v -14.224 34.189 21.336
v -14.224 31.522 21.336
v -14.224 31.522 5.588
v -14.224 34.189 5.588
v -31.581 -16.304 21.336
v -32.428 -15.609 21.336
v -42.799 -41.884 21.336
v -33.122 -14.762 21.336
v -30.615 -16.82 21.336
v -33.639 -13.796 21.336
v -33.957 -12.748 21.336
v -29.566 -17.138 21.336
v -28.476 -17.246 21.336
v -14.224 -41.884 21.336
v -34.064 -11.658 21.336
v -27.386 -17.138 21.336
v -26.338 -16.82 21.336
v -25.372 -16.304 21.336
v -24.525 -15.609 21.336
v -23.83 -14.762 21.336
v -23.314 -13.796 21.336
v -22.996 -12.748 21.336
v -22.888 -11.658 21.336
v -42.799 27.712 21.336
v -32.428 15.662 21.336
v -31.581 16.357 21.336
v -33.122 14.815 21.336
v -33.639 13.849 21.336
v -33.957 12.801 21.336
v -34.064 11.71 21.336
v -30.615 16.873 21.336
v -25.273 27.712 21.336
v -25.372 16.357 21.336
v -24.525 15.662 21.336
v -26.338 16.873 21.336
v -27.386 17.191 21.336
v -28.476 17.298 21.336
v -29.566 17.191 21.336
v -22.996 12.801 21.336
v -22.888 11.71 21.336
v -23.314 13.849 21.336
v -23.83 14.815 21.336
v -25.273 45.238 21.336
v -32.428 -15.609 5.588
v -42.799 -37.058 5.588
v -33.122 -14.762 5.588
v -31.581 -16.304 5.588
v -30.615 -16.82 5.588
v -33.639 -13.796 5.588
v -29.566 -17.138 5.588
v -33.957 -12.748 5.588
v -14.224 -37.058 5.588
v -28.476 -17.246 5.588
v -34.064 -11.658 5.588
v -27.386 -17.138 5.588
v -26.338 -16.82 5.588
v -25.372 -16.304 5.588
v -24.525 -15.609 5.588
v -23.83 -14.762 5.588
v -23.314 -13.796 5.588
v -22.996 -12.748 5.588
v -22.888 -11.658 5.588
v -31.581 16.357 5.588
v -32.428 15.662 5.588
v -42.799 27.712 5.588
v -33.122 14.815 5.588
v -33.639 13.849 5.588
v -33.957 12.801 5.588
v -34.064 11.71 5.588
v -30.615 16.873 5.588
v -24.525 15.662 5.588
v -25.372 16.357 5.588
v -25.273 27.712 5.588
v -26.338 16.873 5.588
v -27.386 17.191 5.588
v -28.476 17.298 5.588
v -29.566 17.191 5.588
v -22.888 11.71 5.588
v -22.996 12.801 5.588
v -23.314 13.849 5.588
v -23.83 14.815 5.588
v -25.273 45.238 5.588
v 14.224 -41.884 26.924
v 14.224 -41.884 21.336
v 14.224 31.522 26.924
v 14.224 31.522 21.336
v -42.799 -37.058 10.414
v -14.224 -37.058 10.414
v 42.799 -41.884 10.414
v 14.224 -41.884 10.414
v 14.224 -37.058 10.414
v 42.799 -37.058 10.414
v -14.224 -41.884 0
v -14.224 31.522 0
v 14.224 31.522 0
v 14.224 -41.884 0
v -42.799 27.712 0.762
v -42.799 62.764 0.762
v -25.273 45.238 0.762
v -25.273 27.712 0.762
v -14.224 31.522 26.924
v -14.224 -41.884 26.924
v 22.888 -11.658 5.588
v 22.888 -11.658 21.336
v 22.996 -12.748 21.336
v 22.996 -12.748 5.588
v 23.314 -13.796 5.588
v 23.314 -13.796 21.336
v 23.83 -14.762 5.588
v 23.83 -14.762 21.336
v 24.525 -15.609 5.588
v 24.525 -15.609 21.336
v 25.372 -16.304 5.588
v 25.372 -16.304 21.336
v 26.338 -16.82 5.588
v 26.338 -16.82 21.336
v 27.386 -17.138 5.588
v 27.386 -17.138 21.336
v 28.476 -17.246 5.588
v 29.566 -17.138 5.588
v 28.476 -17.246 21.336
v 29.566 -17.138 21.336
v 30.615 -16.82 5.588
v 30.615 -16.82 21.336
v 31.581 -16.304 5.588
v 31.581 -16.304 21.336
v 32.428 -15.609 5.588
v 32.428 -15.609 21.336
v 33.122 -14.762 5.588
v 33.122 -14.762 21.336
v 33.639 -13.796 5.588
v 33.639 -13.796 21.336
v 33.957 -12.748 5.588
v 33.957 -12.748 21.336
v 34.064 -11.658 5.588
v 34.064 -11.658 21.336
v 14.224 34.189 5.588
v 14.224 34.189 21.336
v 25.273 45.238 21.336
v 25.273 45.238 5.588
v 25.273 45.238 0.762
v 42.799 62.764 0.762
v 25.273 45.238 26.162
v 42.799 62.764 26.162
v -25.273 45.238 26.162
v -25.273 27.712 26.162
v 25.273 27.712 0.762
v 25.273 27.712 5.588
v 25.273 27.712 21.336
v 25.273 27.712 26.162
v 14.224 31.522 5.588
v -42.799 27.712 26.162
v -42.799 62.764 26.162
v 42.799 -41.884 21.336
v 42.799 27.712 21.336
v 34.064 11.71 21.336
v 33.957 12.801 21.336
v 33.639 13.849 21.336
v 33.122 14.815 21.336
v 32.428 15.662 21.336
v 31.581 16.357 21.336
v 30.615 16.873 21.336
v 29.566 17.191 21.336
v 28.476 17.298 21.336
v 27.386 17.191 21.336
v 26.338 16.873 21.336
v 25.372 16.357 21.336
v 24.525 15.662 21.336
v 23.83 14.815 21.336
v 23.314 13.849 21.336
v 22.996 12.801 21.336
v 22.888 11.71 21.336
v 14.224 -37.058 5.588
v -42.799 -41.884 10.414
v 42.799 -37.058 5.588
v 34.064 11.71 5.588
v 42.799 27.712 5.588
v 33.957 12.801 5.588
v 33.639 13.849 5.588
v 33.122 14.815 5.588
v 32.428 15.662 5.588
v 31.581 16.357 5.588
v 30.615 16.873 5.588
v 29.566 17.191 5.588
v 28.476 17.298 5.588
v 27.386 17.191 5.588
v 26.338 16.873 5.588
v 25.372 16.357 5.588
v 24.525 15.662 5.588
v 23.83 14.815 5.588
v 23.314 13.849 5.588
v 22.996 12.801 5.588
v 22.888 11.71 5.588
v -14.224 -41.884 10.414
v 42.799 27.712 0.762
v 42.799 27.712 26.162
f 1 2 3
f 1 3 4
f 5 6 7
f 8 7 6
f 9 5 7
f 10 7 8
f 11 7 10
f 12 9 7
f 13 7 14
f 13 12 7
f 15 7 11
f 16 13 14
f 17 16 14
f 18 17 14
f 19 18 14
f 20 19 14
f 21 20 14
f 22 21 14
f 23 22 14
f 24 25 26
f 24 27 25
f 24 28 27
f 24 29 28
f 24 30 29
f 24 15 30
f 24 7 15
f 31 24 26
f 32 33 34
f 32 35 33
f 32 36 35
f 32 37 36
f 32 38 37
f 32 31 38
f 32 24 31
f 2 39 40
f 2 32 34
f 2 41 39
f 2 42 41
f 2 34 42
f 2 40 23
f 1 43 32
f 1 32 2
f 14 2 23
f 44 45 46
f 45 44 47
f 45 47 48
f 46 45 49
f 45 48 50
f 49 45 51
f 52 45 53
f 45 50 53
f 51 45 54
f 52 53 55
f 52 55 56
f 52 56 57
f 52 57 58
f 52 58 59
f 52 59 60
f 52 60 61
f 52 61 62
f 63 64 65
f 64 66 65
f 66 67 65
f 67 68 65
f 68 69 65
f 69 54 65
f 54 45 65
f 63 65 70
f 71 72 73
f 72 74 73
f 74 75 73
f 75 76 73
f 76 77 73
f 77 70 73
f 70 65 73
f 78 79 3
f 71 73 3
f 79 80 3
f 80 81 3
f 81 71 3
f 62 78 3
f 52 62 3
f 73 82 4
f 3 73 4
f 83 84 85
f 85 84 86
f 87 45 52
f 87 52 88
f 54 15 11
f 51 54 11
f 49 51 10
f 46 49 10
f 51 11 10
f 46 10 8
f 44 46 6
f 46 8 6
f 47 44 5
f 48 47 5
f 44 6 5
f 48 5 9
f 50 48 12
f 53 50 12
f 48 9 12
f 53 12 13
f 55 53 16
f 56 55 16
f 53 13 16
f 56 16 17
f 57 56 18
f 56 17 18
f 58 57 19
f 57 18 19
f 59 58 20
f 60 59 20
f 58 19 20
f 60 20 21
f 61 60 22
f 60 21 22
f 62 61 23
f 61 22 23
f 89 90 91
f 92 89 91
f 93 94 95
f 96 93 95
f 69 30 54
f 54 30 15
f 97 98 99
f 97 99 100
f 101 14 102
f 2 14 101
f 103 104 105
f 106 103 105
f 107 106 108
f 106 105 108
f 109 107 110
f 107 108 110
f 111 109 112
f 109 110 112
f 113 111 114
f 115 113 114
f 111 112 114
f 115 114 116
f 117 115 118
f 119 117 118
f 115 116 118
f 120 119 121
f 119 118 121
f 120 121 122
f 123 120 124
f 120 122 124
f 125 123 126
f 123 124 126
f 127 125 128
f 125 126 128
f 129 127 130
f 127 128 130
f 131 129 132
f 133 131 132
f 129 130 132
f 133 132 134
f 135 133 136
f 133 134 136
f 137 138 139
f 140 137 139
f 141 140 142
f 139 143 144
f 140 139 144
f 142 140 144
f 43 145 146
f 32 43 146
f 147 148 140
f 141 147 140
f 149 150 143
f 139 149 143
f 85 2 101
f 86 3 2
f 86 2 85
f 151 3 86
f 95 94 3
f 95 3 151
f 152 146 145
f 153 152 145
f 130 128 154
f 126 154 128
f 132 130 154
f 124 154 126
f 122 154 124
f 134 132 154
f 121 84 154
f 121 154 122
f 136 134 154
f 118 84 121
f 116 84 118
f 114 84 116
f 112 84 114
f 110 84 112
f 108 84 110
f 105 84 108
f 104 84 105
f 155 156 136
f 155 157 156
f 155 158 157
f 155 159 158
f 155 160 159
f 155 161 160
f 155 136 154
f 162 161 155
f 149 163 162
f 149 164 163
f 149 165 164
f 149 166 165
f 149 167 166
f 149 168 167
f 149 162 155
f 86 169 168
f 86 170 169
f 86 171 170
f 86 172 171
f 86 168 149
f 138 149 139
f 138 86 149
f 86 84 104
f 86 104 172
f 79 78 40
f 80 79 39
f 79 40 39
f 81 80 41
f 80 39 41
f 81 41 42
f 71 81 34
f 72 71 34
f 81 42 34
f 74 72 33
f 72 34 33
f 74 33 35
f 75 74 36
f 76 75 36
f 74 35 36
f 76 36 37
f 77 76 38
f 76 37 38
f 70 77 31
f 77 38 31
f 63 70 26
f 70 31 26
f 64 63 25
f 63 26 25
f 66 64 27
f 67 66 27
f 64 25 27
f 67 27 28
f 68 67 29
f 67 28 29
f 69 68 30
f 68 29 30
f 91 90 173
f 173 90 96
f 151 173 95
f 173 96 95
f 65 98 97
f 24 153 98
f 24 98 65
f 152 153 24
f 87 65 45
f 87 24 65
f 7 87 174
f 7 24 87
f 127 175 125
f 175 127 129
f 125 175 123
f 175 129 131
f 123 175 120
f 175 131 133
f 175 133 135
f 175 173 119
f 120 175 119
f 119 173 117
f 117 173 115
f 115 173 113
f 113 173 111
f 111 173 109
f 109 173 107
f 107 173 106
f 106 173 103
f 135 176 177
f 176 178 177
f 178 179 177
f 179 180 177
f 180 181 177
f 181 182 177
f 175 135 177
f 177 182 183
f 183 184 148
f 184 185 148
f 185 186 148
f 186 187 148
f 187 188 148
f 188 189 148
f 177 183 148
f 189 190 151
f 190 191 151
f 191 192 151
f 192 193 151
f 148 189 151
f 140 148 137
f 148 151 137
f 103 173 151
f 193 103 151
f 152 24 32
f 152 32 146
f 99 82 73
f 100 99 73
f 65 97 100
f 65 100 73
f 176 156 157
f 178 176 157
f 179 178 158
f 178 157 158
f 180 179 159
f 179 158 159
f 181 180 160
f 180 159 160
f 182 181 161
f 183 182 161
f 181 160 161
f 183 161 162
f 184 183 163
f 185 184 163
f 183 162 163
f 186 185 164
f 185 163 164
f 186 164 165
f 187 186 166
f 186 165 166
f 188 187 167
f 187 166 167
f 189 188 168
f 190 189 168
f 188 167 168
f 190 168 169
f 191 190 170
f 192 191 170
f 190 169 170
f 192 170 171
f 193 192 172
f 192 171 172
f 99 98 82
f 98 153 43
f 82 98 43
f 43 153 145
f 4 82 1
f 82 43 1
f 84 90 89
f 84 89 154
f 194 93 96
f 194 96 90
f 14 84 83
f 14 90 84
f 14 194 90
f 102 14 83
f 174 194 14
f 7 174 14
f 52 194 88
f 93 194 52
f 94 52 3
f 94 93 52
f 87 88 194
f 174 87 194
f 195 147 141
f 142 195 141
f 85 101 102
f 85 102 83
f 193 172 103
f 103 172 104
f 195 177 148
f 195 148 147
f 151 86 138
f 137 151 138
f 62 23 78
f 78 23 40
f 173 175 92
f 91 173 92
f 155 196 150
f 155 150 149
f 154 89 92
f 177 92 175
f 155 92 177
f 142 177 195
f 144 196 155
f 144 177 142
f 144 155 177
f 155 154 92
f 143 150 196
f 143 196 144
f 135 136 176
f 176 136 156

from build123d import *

# Parameters (mm, degrees)
F0_W      = 28.448
F0_H      = 73.406
F1_DEPTH  = 26.924
F2_W      = 104.648
F2_H      = 15.748
F3_DEPTH  = 28.575
F4_W      = 28.575
F4_H      = 104.648
F5_DEPTH  = 15.748
F6_W      = 4.826
F6_H      = 4.826
F5_FACE_W = 104.648
F5_FACE_H = 15.748
F7_DEPTH  = 28.575
F8_W      = 4.826
F8_H      = 4.826
F9_DEPTH  = 28.575
F11_DEPTH = 25.4
F13_DEPTH = 25.4
F15_DEPTH = 17.526
F17_DEPTH = 25.4
F18_W     = 35.052
F18_H     = 4.826
F18_H_2   = 15.748
F19_DEPTH = 17.526
F21_DEPTH = 25.4
F23_DEPTH = 25.4


with BuildPart() as f1:
    # F0 (on Top) → F1 (new body)
    with BuildSketch(Plane.XY):
        with Locations((0, -5.180504173)):
            Rectangle(F0_W, F0_H)
    extrude(amount=F1_DEPTH)

    # F2 (on face) → F3 (join)
    with BuildSketch(Plane.YZ.offset(14.224)):
        with Locations((10.440495827, 13.462)):
            Rectangle(F2_W, F2_H)
    extrude(amount=F3_DEPTH)

    # F4 (on face) → F5 (join)
    with BuildSketch(Plane.XY.offset(21.336)):
        with Locations((28.5115, 10.440495827)):
            Rectangle(F4_W, F4_H)
        with Locations((-28.5115, 10.440495827)):
            Rectangle(F4_W, F4_H)
    extrude(amount=-F5_DEPTH)

    # F6 (on face) + F5_face (on face) → F7 (cut)
    with BuildSketch(Plane.YZ.offset(42.799)):
        with Locations((-39.470504173, 8.001)):
            Rectangle(F6_W, F6_H)
    with BuildSketch(Plane(origin=(-42.799, 10.440495827, 13.462), x_dir=(0, -1, 0), z_dir=(-1, 0, 0))):
        Rectangle(F5_FACE_W, F5_FACE_H)
    extrude(amount=-F7_DEPTH, dir=(1, 0, 0), mode=Mode.SUBTRACT)

    # F8 (on face) → F9 (cut)
    with BuildSketch(Plane(origin=(-42.799, 0, 0), x_dir=(0, -1, 0), z_dir=(-1, 0, 0))):
        with Locations((39.470504173, 8.001)):
            Rectangle(F8_W, F8_H)
    extrude(amount=-F9_DEPTH, mode=Mode.SUBTRACT)

    # F10 (on face) → F11 (cut)
    with BuildSketch(Plane(origin=(0, 0, 5.588), x_dir=(1, 0, 0), z_dir=(0, 0, -1))):
        Polygon((-14.224, -34.189495827), (-42.799, -62.764495827), (-14.224, -62.764495827), align=None)
    extrude(amount=-F11_DEPTH, mode=Mode.SUBTRACT)

    # F12 (on face) → F13 (cut)
    with BuildSketch(Plane.XY.offset(21.336)):
        Polygon((42.799, 62.764495827), (14.224, 62.764495827), (14.224, 34.189495827), align=None)
    extrude(amount=-F13_DEPTH, mode=Mode.SUBTRACT)

    # F14 (on face) → F15 (join)
    with BuildSketch(Plane(origin=(-42.799, 0, 0), x_dir=(0, -1, 0), z_dir=(-1, 0, 0))):
        Polygon((-62.764495827, 26.162), (-62.764495827, 21.336), (-62.764495827, 5.588), (-62.764495827, 0.762), (-27.712495827, 0.762), (-27.712495827, 5.588), (-27.712495827, 21.336), (-27.712495827, 26.162), align=None)
    extrude(amount=-F15_DEPTH)

    # F16 (on face) → F17 (cut)
    with BuildSketch(Plane.XY.offset(26.162)):
        Polygon((-25.273, 45.238495827), (-25.273, 62.764495827), (-42.799, 62.764495827), align=None)
    extrude(amount=-F17_DEPTH, mode=Mode.SUBTRACT)

    # F18 (on face) → F19 (join)
    with BuildSketch(Plane.YZ.offset(42.799)):
        with Locations((45.238495827, 23.749)):
            Rectangle(F18_W, F18_H)
        with Locations((45.238495827, 13.462)):
            Rectangle(F18_W, F18_H_2)
        with Locations((45.238495827, 3.175)):
            Rectangle(F18_W, F18_H)
    extrude(amount=-F19_DEPTH)

    # F20 (on face) → F21 (cut)
    with BuildSketch(Plane.XY.offset(26.162)):
        Polygon((25.273, 45.238495827), (42.799, 62.764495827), (25.273, 62.764495827), align=None)
    extrude(amount=-F21_DEPTH, mode=Mode.SUBTRACT)

    # F22 (on face) → F23 (cut)
    with BuildSketch(Plane.XY.offset(21.336)):
        with BuildLine():
            ThreePointArc((-22.8882461797, 11.710495827), (-28.4762461797, 17.298495827), (-34.0642461797, 11.710495827))
            Line((-34.0642461797, 11.710495827), (-34.0642461797, -11.657504173))
            ThreePointArc((-34.0642461797, -11.657504173), (-28.4762461797, -17.245504173), (-22.8882461797, -11.657504173))
            Line((-22.8882461797, -11.657504173), (-22.8882461797, 11.710495827))
        make_face()
        with BuildLine():
            Line((34.0642461797, -11.657504173), (34.0642461797, 11.710495827))
            ThreePointArc((34.0642461797, 11.710495827), (28.4762461797, 17.298495827), (22.8882461797, 11.710495827))
            Line((22.8882461797, 11.710495827), (22.8882461797, -11.657504173))
            ThreePointArc((22.8882461797, -11.657504173), (28.4762461797, -17.245504173), (34.0642461797, -11.657504173))
        make_face()
    extrude(amount=-F23_DEPTH, mode=Mode.SUBTRACT)


solid = f1.part
